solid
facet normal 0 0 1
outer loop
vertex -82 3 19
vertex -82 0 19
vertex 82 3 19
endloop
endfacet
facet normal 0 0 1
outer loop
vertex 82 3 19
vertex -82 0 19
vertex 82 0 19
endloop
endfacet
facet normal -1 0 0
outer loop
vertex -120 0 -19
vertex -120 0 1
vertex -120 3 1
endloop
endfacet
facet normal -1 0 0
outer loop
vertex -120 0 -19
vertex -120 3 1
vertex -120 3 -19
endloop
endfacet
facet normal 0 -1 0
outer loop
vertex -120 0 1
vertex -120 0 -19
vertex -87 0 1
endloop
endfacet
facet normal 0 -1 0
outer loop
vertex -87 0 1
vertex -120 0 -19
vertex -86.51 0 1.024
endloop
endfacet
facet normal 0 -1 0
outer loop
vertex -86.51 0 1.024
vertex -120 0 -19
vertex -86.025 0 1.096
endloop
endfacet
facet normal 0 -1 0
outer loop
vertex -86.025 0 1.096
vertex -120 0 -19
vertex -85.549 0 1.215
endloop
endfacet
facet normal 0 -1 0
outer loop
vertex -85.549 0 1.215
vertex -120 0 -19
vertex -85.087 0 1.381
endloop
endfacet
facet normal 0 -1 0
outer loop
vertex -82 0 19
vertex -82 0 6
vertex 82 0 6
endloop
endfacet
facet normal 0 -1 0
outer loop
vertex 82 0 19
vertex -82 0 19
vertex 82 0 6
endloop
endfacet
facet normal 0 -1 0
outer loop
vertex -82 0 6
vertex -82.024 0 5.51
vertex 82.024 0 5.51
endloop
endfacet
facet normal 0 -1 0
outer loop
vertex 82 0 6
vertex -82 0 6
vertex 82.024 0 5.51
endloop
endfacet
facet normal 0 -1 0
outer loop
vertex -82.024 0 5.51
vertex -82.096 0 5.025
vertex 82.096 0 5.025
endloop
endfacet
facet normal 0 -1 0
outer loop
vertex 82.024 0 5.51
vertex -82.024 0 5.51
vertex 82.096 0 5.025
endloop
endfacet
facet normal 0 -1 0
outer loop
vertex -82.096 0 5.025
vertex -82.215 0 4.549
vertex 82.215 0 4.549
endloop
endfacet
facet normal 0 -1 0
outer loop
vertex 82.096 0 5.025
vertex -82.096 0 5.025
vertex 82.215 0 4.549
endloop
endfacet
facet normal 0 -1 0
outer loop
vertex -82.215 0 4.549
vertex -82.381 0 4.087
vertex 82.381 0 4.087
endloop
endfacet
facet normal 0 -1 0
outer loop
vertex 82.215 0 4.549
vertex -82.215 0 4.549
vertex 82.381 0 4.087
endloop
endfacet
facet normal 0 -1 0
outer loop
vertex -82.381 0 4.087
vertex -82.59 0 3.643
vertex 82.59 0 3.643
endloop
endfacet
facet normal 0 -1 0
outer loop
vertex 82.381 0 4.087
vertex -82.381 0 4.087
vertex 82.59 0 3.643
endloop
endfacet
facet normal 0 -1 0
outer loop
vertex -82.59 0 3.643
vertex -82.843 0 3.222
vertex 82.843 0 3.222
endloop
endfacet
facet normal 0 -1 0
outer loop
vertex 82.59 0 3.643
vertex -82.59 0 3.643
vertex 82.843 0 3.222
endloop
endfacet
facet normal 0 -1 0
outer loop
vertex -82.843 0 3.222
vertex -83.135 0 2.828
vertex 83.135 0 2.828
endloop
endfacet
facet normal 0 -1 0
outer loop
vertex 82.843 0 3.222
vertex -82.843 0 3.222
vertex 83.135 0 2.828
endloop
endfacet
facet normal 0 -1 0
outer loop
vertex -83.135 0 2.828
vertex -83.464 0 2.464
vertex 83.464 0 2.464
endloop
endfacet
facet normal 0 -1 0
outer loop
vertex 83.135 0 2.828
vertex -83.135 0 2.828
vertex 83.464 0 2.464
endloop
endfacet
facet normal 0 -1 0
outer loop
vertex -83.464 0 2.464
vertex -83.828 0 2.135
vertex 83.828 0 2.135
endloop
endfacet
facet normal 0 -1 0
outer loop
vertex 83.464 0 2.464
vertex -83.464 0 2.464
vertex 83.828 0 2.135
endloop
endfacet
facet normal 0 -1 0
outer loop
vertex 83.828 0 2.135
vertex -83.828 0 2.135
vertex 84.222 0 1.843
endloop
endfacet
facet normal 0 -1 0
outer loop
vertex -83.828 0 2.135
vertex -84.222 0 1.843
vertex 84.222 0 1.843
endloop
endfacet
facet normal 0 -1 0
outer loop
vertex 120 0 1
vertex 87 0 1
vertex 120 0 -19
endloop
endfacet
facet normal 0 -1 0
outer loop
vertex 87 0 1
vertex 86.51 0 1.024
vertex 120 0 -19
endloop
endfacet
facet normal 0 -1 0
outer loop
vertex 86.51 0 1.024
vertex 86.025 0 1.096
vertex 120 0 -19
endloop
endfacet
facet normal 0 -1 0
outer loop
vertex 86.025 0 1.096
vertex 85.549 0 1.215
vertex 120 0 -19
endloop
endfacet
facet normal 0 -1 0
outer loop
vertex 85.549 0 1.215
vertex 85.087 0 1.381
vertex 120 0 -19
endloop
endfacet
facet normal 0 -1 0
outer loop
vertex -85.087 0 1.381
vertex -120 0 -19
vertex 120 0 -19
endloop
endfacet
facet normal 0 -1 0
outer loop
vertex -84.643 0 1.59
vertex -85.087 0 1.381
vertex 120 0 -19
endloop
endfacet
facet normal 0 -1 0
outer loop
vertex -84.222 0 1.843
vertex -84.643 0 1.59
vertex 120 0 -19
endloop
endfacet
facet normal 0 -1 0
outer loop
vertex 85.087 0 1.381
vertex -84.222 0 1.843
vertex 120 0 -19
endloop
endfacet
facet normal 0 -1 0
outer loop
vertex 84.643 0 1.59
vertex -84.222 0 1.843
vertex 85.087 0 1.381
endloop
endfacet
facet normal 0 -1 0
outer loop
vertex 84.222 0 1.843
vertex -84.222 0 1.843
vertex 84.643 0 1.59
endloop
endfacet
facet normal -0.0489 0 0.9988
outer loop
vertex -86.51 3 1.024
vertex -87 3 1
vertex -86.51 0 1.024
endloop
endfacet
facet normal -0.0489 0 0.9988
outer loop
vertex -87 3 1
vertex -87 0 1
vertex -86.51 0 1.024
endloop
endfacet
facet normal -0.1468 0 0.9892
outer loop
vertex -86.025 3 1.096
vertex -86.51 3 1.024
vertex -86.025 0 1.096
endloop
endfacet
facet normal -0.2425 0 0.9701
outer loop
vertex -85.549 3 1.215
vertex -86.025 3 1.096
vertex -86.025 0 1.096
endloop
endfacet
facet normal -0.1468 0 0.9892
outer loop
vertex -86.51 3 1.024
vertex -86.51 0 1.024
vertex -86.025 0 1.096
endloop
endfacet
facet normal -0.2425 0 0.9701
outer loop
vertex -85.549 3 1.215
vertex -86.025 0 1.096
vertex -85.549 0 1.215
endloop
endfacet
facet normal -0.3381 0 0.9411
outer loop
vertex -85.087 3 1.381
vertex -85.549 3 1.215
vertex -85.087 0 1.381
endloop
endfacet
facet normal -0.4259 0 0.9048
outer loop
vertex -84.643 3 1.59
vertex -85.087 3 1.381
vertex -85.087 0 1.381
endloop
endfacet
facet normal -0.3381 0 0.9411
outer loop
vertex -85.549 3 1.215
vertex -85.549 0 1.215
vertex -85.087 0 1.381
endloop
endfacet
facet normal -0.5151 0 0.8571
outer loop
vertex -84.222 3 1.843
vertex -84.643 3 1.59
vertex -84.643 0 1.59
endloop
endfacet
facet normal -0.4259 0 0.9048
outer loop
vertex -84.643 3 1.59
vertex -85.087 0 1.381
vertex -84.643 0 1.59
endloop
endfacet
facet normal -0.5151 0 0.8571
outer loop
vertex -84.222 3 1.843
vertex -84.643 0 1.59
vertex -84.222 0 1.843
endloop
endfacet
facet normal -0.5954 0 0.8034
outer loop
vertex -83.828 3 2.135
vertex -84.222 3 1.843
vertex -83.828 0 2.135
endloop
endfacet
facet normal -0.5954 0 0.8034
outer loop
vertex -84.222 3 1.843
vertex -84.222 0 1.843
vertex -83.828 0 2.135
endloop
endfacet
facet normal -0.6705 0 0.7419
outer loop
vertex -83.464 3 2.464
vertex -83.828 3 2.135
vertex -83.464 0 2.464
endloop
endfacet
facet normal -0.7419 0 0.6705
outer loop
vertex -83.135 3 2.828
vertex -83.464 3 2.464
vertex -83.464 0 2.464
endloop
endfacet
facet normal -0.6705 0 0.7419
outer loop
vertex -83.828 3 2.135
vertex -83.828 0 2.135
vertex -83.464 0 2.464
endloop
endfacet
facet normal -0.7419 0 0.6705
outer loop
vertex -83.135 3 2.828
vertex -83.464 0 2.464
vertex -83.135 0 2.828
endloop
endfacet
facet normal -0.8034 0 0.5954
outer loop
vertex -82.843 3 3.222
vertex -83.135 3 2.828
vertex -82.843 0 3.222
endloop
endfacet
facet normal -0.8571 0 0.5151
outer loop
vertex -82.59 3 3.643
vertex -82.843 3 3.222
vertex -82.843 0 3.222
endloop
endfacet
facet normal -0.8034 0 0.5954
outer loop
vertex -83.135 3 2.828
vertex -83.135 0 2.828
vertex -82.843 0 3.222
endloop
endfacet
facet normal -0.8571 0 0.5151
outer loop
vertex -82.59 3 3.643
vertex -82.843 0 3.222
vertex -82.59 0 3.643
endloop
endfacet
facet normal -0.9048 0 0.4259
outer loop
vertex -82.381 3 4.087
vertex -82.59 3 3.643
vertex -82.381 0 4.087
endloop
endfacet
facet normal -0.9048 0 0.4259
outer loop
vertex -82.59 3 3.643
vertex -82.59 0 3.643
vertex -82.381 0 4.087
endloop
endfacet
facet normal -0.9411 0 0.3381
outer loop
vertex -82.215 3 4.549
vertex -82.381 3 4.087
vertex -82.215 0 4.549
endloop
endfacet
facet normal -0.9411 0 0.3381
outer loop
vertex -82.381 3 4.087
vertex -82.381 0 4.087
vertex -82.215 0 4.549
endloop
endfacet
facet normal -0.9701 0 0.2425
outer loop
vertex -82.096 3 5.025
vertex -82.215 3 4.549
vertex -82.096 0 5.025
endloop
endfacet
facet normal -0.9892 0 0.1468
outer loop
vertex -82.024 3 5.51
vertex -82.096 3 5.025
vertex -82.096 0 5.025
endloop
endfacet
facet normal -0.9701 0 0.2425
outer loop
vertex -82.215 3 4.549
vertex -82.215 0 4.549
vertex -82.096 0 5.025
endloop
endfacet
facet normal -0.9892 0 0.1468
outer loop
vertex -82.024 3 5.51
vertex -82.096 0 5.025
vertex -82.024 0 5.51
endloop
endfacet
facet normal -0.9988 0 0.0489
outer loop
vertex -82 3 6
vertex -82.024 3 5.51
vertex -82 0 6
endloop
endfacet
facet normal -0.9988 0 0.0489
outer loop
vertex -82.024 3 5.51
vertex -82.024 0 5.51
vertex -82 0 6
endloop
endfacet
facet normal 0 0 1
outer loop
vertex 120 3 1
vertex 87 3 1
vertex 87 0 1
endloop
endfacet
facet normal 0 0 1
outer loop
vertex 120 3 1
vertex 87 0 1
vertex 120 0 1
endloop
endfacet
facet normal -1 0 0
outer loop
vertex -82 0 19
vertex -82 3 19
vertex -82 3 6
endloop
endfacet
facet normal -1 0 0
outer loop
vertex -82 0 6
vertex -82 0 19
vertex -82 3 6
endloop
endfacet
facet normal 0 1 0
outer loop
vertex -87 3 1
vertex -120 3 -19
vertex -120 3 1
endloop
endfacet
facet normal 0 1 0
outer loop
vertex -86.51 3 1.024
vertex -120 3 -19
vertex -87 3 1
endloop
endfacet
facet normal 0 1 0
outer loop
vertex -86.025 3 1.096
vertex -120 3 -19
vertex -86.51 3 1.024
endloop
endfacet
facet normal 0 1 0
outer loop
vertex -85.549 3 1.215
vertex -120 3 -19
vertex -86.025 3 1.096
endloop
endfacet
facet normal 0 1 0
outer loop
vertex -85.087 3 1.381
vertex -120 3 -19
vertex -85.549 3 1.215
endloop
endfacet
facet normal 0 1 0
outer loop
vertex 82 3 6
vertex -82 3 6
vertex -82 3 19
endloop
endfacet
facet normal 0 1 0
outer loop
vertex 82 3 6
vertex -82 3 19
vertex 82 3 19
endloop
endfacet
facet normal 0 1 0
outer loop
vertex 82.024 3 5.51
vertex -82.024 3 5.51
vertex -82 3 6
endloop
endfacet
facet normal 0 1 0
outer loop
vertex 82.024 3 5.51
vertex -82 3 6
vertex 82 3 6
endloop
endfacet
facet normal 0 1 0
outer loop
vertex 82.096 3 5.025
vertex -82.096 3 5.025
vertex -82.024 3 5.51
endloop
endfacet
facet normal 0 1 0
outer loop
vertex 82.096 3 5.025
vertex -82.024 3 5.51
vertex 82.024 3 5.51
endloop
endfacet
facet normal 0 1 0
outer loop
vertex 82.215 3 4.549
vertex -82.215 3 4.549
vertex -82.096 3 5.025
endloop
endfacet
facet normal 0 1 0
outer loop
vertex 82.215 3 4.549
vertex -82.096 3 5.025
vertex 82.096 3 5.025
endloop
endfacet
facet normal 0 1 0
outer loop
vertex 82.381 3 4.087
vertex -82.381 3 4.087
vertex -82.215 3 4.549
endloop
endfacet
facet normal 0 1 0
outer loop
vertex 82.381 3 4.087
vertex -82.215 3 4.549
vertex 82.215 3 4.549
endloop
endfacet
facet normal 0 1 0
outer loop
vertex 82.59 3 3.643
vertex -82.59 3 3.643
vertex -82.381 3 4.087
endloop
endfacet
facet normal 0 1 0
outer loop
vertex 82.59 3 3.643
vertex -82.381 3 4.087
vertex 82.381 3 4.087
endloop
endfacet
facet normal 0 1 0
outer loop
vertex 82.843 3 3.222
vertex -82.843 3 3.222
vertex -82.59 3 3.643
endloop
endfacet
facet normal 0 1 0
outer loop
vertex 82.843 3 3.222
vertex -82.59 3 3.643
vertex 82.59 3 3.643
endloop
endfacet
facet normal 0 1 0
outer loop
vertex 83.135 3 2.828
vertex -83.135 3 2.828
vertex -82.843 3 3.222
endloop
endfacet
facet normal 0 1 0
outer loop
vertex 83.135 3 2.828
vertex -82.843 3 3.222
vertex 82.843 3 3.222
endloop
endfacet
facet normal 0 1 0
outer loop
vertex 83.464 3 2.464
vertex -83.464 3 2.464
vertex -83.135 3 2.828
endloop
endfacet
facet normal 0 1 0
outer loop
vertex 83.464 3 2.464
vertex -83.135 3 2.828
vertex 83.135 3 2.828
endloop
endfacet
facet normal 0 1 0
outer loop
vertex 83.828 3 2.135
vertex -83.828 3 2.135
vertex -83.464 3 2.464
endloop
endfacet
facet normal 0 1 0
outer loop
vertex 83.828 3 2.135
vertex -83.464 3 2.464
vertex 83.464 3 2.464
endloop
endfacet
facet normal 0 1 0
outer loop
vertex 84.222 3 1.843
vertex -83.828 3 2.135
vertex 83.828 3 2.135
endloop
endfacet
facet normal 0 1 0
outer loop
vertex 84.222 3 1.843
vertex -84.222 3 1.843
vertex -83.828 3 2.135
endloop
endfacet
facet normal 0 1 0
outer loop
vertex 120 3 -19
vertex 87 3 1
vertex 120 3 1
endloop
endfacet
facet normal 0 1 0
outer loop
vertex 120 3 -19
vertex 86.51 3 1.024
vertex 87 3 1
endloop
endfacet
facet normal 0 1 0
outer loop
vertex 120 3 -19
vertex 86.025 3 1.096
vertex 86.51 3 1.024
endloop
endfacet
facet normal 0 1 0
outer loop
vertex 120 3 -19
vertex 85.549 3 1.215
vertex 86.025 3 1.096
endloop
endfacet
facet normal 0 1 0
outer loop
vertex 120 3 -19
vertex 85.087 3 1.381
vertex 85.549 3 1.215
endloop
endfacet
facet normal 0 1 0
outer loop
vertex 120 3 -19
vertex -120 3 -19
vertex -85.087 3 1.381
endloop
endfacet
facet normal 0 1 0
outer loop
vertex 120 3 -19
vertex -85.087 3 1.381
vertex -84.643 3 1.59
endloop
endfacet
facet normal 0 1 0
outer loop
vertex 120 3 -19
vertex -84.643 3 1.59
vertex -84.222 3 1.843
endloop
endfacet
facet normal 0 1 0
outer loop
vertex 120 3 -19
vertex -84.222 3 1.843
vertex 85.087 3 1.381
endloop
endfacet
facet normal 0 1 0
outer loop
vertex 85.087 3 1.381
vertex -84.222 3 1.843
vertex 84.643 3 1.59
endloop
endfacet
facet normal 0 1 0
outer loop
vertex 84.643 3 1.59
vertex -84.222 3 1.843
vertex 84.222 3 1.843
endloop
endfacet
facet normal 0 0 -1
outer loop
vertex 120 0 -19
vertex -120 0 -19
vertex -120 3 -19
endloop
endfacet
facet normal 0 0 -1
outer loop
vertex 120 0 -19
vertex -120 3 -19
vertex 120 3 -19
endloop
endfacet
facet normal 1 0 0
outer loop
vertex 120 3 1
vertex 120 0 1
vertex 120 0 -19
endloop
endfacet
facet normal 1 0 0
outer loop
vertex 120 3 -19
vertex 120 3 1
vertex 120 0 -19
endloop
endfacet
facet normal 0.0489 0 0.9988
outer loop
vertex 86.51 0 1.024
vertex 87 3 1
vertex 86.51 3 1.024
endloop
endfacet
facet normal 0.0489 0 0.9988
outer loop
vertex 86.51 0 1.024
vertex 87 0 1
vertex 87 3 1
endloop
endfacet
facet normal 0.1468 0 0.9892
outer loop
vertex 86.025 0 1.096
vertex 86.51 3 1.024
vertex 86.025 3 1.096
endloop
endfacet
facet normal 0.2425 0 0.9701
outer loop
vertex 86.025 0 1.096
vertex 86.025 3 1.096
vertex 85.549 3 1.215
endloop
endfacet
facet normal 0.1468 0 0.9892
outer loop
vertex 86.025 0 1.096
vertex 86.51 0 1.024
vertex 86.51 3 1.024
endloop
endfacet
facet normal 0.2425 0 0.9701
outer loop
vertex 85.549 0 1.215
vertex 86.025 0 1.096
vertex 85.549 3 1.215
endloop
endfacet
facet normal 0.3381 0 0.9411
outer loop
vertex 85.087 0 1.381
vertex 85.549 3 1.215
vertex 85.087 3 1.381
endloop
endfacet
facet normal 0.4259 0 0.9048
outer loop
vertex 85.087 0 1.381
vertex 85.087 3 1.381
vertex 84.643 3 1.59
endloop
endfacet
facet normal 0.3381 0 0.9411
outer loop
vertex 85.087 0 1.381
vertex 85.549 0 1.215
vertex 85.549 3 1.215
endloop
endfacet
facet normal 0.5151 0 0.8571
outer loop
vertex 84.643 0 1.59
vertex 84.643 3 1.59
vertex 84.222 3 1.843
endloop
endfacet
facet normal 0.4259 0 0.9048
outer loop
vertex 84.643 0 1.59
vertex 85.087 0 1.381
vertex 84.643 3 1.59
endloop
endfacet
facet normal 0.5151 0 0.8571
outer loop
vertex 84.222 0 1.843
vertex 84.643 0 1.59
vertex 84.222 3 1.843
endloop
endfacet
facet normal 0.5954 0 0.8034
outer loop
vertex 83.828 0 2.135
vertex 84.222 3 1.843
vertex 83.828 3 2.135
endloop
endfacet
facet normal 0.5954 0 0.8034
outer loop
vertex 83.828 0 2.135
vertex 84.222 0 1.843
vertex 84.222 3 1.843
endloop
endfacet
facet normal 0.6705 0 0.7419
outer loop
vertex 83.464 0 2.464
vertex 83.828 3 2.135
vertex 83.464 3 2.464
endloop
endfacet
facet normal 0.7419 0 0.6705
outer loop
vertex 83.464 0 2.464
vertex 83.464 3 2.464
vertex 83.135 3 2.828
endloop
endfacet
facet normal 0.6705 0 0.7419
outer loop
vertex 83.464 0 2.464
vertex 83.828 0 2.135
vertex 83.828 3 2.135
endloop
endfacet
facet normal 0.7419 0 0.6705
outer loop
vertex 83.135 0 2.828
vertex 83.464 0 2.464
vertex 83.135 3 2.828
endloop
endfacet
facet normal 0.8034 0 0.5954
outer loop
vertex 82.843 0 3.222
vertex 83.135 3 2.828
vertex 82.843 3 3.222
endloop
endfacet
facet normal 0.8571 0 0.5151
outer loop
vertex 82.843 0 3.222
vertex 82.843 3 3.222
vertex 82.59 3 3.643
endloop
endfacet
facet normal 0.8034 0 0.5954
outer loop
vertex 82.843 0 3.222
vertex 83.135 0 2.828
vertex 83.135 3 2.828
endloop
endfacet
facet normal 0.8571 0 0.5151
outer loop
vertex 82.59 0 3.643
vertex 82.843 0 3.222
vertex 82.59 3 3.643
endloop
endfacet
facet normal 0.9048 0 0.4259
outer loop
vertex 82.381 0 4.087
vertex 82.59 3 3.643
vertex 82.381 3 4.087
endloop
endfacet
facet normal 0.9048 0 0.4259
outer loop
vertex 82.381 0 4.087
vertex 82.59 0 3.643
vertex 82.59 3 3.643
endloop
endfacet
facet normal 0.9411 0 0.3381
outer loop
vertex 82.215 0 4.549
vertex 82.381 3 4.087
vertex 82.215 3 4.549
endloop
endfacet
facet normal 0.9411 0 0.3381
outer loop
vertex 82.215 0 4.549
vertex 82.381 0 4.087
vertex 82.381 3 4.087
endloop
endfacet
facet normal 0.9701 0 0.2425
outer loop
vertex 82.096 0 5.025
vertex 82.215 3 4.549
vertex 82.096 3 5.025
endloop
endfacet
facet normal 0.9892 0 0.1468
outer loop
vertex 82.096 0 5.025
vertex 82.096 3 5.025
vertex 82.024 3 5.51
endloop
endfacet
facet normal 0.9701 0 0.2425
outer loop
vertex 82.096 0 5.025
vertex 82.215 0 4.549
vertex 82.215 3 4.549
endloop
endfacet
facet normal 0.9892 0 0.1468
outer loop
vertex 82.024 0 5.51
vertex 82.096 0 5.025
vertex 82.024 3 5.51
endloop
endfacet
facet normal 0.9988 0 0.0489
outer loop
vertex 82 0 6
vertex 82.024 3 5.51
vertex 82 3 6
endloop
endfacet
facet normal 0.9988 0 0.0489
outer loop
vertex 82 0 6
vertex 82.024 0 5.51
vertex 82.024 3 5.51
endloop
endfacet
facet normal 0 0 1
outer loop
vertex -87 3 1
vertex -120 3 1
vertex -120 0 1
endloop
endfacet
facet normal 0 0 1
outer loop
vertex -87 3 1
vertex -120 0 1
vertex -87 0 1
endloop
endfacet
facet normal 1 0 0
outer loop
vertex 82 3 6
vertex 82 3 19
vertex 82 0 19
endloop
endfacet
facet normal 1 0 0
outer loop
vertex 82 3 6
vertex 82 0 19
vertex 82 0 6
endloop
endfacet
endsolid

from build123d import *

# Parameters (mm, degrees)
SKETCH1_W           = 240
SKETCH1_H           = 38
BOSS_EXTRUDE1_DEPTH = 3
SKETCH2_W           = 38
SKETCH2_H           = 18
CUT_EXTRUDE1_DEPTH  = 3
FILLET1_R           = 5


with BuildPart() as part:
    # Sketch1 → Boss-Extrude1 (new body)
    with BuildSketch(Plane(origin=(0, 0, 0), x_dir=(1, 0, 0), z_dir=(0, 1, 0))):
        Rectangle(SKETCH1_W, SKETCH1_H)
    extrude(amount=BOSS_EXTRUDE1_DEPTH)

    # Sketch2 → Cut-Extrude1 (cut)
    with BuildSketch(Plane(origin=(0, 3, 0), x_dir=(1, 0, 0), z_dir=(0, 1, 0))):
        with Locations((-101, -10)):
            Rectangle(SKETCH2_W, SKETCH2_H)
        with Locations((101, -10)):
            Rectangle(SKETCH2_W, SKETCH2_H)
    extrude(amount=-CUT_EXTRUDE1_DEPTH, mode=Mode.SUBTRACT)

    # Fillet1
    fillet1_edges = [part.edges().sort_by_distance(p)[0] for p in [
        (-82, 1.5, 1),
        (82, 1.5, 1),
    ]]
    fillet(fillet1_edges, radius=FILLET1_R)


solid = part.part
